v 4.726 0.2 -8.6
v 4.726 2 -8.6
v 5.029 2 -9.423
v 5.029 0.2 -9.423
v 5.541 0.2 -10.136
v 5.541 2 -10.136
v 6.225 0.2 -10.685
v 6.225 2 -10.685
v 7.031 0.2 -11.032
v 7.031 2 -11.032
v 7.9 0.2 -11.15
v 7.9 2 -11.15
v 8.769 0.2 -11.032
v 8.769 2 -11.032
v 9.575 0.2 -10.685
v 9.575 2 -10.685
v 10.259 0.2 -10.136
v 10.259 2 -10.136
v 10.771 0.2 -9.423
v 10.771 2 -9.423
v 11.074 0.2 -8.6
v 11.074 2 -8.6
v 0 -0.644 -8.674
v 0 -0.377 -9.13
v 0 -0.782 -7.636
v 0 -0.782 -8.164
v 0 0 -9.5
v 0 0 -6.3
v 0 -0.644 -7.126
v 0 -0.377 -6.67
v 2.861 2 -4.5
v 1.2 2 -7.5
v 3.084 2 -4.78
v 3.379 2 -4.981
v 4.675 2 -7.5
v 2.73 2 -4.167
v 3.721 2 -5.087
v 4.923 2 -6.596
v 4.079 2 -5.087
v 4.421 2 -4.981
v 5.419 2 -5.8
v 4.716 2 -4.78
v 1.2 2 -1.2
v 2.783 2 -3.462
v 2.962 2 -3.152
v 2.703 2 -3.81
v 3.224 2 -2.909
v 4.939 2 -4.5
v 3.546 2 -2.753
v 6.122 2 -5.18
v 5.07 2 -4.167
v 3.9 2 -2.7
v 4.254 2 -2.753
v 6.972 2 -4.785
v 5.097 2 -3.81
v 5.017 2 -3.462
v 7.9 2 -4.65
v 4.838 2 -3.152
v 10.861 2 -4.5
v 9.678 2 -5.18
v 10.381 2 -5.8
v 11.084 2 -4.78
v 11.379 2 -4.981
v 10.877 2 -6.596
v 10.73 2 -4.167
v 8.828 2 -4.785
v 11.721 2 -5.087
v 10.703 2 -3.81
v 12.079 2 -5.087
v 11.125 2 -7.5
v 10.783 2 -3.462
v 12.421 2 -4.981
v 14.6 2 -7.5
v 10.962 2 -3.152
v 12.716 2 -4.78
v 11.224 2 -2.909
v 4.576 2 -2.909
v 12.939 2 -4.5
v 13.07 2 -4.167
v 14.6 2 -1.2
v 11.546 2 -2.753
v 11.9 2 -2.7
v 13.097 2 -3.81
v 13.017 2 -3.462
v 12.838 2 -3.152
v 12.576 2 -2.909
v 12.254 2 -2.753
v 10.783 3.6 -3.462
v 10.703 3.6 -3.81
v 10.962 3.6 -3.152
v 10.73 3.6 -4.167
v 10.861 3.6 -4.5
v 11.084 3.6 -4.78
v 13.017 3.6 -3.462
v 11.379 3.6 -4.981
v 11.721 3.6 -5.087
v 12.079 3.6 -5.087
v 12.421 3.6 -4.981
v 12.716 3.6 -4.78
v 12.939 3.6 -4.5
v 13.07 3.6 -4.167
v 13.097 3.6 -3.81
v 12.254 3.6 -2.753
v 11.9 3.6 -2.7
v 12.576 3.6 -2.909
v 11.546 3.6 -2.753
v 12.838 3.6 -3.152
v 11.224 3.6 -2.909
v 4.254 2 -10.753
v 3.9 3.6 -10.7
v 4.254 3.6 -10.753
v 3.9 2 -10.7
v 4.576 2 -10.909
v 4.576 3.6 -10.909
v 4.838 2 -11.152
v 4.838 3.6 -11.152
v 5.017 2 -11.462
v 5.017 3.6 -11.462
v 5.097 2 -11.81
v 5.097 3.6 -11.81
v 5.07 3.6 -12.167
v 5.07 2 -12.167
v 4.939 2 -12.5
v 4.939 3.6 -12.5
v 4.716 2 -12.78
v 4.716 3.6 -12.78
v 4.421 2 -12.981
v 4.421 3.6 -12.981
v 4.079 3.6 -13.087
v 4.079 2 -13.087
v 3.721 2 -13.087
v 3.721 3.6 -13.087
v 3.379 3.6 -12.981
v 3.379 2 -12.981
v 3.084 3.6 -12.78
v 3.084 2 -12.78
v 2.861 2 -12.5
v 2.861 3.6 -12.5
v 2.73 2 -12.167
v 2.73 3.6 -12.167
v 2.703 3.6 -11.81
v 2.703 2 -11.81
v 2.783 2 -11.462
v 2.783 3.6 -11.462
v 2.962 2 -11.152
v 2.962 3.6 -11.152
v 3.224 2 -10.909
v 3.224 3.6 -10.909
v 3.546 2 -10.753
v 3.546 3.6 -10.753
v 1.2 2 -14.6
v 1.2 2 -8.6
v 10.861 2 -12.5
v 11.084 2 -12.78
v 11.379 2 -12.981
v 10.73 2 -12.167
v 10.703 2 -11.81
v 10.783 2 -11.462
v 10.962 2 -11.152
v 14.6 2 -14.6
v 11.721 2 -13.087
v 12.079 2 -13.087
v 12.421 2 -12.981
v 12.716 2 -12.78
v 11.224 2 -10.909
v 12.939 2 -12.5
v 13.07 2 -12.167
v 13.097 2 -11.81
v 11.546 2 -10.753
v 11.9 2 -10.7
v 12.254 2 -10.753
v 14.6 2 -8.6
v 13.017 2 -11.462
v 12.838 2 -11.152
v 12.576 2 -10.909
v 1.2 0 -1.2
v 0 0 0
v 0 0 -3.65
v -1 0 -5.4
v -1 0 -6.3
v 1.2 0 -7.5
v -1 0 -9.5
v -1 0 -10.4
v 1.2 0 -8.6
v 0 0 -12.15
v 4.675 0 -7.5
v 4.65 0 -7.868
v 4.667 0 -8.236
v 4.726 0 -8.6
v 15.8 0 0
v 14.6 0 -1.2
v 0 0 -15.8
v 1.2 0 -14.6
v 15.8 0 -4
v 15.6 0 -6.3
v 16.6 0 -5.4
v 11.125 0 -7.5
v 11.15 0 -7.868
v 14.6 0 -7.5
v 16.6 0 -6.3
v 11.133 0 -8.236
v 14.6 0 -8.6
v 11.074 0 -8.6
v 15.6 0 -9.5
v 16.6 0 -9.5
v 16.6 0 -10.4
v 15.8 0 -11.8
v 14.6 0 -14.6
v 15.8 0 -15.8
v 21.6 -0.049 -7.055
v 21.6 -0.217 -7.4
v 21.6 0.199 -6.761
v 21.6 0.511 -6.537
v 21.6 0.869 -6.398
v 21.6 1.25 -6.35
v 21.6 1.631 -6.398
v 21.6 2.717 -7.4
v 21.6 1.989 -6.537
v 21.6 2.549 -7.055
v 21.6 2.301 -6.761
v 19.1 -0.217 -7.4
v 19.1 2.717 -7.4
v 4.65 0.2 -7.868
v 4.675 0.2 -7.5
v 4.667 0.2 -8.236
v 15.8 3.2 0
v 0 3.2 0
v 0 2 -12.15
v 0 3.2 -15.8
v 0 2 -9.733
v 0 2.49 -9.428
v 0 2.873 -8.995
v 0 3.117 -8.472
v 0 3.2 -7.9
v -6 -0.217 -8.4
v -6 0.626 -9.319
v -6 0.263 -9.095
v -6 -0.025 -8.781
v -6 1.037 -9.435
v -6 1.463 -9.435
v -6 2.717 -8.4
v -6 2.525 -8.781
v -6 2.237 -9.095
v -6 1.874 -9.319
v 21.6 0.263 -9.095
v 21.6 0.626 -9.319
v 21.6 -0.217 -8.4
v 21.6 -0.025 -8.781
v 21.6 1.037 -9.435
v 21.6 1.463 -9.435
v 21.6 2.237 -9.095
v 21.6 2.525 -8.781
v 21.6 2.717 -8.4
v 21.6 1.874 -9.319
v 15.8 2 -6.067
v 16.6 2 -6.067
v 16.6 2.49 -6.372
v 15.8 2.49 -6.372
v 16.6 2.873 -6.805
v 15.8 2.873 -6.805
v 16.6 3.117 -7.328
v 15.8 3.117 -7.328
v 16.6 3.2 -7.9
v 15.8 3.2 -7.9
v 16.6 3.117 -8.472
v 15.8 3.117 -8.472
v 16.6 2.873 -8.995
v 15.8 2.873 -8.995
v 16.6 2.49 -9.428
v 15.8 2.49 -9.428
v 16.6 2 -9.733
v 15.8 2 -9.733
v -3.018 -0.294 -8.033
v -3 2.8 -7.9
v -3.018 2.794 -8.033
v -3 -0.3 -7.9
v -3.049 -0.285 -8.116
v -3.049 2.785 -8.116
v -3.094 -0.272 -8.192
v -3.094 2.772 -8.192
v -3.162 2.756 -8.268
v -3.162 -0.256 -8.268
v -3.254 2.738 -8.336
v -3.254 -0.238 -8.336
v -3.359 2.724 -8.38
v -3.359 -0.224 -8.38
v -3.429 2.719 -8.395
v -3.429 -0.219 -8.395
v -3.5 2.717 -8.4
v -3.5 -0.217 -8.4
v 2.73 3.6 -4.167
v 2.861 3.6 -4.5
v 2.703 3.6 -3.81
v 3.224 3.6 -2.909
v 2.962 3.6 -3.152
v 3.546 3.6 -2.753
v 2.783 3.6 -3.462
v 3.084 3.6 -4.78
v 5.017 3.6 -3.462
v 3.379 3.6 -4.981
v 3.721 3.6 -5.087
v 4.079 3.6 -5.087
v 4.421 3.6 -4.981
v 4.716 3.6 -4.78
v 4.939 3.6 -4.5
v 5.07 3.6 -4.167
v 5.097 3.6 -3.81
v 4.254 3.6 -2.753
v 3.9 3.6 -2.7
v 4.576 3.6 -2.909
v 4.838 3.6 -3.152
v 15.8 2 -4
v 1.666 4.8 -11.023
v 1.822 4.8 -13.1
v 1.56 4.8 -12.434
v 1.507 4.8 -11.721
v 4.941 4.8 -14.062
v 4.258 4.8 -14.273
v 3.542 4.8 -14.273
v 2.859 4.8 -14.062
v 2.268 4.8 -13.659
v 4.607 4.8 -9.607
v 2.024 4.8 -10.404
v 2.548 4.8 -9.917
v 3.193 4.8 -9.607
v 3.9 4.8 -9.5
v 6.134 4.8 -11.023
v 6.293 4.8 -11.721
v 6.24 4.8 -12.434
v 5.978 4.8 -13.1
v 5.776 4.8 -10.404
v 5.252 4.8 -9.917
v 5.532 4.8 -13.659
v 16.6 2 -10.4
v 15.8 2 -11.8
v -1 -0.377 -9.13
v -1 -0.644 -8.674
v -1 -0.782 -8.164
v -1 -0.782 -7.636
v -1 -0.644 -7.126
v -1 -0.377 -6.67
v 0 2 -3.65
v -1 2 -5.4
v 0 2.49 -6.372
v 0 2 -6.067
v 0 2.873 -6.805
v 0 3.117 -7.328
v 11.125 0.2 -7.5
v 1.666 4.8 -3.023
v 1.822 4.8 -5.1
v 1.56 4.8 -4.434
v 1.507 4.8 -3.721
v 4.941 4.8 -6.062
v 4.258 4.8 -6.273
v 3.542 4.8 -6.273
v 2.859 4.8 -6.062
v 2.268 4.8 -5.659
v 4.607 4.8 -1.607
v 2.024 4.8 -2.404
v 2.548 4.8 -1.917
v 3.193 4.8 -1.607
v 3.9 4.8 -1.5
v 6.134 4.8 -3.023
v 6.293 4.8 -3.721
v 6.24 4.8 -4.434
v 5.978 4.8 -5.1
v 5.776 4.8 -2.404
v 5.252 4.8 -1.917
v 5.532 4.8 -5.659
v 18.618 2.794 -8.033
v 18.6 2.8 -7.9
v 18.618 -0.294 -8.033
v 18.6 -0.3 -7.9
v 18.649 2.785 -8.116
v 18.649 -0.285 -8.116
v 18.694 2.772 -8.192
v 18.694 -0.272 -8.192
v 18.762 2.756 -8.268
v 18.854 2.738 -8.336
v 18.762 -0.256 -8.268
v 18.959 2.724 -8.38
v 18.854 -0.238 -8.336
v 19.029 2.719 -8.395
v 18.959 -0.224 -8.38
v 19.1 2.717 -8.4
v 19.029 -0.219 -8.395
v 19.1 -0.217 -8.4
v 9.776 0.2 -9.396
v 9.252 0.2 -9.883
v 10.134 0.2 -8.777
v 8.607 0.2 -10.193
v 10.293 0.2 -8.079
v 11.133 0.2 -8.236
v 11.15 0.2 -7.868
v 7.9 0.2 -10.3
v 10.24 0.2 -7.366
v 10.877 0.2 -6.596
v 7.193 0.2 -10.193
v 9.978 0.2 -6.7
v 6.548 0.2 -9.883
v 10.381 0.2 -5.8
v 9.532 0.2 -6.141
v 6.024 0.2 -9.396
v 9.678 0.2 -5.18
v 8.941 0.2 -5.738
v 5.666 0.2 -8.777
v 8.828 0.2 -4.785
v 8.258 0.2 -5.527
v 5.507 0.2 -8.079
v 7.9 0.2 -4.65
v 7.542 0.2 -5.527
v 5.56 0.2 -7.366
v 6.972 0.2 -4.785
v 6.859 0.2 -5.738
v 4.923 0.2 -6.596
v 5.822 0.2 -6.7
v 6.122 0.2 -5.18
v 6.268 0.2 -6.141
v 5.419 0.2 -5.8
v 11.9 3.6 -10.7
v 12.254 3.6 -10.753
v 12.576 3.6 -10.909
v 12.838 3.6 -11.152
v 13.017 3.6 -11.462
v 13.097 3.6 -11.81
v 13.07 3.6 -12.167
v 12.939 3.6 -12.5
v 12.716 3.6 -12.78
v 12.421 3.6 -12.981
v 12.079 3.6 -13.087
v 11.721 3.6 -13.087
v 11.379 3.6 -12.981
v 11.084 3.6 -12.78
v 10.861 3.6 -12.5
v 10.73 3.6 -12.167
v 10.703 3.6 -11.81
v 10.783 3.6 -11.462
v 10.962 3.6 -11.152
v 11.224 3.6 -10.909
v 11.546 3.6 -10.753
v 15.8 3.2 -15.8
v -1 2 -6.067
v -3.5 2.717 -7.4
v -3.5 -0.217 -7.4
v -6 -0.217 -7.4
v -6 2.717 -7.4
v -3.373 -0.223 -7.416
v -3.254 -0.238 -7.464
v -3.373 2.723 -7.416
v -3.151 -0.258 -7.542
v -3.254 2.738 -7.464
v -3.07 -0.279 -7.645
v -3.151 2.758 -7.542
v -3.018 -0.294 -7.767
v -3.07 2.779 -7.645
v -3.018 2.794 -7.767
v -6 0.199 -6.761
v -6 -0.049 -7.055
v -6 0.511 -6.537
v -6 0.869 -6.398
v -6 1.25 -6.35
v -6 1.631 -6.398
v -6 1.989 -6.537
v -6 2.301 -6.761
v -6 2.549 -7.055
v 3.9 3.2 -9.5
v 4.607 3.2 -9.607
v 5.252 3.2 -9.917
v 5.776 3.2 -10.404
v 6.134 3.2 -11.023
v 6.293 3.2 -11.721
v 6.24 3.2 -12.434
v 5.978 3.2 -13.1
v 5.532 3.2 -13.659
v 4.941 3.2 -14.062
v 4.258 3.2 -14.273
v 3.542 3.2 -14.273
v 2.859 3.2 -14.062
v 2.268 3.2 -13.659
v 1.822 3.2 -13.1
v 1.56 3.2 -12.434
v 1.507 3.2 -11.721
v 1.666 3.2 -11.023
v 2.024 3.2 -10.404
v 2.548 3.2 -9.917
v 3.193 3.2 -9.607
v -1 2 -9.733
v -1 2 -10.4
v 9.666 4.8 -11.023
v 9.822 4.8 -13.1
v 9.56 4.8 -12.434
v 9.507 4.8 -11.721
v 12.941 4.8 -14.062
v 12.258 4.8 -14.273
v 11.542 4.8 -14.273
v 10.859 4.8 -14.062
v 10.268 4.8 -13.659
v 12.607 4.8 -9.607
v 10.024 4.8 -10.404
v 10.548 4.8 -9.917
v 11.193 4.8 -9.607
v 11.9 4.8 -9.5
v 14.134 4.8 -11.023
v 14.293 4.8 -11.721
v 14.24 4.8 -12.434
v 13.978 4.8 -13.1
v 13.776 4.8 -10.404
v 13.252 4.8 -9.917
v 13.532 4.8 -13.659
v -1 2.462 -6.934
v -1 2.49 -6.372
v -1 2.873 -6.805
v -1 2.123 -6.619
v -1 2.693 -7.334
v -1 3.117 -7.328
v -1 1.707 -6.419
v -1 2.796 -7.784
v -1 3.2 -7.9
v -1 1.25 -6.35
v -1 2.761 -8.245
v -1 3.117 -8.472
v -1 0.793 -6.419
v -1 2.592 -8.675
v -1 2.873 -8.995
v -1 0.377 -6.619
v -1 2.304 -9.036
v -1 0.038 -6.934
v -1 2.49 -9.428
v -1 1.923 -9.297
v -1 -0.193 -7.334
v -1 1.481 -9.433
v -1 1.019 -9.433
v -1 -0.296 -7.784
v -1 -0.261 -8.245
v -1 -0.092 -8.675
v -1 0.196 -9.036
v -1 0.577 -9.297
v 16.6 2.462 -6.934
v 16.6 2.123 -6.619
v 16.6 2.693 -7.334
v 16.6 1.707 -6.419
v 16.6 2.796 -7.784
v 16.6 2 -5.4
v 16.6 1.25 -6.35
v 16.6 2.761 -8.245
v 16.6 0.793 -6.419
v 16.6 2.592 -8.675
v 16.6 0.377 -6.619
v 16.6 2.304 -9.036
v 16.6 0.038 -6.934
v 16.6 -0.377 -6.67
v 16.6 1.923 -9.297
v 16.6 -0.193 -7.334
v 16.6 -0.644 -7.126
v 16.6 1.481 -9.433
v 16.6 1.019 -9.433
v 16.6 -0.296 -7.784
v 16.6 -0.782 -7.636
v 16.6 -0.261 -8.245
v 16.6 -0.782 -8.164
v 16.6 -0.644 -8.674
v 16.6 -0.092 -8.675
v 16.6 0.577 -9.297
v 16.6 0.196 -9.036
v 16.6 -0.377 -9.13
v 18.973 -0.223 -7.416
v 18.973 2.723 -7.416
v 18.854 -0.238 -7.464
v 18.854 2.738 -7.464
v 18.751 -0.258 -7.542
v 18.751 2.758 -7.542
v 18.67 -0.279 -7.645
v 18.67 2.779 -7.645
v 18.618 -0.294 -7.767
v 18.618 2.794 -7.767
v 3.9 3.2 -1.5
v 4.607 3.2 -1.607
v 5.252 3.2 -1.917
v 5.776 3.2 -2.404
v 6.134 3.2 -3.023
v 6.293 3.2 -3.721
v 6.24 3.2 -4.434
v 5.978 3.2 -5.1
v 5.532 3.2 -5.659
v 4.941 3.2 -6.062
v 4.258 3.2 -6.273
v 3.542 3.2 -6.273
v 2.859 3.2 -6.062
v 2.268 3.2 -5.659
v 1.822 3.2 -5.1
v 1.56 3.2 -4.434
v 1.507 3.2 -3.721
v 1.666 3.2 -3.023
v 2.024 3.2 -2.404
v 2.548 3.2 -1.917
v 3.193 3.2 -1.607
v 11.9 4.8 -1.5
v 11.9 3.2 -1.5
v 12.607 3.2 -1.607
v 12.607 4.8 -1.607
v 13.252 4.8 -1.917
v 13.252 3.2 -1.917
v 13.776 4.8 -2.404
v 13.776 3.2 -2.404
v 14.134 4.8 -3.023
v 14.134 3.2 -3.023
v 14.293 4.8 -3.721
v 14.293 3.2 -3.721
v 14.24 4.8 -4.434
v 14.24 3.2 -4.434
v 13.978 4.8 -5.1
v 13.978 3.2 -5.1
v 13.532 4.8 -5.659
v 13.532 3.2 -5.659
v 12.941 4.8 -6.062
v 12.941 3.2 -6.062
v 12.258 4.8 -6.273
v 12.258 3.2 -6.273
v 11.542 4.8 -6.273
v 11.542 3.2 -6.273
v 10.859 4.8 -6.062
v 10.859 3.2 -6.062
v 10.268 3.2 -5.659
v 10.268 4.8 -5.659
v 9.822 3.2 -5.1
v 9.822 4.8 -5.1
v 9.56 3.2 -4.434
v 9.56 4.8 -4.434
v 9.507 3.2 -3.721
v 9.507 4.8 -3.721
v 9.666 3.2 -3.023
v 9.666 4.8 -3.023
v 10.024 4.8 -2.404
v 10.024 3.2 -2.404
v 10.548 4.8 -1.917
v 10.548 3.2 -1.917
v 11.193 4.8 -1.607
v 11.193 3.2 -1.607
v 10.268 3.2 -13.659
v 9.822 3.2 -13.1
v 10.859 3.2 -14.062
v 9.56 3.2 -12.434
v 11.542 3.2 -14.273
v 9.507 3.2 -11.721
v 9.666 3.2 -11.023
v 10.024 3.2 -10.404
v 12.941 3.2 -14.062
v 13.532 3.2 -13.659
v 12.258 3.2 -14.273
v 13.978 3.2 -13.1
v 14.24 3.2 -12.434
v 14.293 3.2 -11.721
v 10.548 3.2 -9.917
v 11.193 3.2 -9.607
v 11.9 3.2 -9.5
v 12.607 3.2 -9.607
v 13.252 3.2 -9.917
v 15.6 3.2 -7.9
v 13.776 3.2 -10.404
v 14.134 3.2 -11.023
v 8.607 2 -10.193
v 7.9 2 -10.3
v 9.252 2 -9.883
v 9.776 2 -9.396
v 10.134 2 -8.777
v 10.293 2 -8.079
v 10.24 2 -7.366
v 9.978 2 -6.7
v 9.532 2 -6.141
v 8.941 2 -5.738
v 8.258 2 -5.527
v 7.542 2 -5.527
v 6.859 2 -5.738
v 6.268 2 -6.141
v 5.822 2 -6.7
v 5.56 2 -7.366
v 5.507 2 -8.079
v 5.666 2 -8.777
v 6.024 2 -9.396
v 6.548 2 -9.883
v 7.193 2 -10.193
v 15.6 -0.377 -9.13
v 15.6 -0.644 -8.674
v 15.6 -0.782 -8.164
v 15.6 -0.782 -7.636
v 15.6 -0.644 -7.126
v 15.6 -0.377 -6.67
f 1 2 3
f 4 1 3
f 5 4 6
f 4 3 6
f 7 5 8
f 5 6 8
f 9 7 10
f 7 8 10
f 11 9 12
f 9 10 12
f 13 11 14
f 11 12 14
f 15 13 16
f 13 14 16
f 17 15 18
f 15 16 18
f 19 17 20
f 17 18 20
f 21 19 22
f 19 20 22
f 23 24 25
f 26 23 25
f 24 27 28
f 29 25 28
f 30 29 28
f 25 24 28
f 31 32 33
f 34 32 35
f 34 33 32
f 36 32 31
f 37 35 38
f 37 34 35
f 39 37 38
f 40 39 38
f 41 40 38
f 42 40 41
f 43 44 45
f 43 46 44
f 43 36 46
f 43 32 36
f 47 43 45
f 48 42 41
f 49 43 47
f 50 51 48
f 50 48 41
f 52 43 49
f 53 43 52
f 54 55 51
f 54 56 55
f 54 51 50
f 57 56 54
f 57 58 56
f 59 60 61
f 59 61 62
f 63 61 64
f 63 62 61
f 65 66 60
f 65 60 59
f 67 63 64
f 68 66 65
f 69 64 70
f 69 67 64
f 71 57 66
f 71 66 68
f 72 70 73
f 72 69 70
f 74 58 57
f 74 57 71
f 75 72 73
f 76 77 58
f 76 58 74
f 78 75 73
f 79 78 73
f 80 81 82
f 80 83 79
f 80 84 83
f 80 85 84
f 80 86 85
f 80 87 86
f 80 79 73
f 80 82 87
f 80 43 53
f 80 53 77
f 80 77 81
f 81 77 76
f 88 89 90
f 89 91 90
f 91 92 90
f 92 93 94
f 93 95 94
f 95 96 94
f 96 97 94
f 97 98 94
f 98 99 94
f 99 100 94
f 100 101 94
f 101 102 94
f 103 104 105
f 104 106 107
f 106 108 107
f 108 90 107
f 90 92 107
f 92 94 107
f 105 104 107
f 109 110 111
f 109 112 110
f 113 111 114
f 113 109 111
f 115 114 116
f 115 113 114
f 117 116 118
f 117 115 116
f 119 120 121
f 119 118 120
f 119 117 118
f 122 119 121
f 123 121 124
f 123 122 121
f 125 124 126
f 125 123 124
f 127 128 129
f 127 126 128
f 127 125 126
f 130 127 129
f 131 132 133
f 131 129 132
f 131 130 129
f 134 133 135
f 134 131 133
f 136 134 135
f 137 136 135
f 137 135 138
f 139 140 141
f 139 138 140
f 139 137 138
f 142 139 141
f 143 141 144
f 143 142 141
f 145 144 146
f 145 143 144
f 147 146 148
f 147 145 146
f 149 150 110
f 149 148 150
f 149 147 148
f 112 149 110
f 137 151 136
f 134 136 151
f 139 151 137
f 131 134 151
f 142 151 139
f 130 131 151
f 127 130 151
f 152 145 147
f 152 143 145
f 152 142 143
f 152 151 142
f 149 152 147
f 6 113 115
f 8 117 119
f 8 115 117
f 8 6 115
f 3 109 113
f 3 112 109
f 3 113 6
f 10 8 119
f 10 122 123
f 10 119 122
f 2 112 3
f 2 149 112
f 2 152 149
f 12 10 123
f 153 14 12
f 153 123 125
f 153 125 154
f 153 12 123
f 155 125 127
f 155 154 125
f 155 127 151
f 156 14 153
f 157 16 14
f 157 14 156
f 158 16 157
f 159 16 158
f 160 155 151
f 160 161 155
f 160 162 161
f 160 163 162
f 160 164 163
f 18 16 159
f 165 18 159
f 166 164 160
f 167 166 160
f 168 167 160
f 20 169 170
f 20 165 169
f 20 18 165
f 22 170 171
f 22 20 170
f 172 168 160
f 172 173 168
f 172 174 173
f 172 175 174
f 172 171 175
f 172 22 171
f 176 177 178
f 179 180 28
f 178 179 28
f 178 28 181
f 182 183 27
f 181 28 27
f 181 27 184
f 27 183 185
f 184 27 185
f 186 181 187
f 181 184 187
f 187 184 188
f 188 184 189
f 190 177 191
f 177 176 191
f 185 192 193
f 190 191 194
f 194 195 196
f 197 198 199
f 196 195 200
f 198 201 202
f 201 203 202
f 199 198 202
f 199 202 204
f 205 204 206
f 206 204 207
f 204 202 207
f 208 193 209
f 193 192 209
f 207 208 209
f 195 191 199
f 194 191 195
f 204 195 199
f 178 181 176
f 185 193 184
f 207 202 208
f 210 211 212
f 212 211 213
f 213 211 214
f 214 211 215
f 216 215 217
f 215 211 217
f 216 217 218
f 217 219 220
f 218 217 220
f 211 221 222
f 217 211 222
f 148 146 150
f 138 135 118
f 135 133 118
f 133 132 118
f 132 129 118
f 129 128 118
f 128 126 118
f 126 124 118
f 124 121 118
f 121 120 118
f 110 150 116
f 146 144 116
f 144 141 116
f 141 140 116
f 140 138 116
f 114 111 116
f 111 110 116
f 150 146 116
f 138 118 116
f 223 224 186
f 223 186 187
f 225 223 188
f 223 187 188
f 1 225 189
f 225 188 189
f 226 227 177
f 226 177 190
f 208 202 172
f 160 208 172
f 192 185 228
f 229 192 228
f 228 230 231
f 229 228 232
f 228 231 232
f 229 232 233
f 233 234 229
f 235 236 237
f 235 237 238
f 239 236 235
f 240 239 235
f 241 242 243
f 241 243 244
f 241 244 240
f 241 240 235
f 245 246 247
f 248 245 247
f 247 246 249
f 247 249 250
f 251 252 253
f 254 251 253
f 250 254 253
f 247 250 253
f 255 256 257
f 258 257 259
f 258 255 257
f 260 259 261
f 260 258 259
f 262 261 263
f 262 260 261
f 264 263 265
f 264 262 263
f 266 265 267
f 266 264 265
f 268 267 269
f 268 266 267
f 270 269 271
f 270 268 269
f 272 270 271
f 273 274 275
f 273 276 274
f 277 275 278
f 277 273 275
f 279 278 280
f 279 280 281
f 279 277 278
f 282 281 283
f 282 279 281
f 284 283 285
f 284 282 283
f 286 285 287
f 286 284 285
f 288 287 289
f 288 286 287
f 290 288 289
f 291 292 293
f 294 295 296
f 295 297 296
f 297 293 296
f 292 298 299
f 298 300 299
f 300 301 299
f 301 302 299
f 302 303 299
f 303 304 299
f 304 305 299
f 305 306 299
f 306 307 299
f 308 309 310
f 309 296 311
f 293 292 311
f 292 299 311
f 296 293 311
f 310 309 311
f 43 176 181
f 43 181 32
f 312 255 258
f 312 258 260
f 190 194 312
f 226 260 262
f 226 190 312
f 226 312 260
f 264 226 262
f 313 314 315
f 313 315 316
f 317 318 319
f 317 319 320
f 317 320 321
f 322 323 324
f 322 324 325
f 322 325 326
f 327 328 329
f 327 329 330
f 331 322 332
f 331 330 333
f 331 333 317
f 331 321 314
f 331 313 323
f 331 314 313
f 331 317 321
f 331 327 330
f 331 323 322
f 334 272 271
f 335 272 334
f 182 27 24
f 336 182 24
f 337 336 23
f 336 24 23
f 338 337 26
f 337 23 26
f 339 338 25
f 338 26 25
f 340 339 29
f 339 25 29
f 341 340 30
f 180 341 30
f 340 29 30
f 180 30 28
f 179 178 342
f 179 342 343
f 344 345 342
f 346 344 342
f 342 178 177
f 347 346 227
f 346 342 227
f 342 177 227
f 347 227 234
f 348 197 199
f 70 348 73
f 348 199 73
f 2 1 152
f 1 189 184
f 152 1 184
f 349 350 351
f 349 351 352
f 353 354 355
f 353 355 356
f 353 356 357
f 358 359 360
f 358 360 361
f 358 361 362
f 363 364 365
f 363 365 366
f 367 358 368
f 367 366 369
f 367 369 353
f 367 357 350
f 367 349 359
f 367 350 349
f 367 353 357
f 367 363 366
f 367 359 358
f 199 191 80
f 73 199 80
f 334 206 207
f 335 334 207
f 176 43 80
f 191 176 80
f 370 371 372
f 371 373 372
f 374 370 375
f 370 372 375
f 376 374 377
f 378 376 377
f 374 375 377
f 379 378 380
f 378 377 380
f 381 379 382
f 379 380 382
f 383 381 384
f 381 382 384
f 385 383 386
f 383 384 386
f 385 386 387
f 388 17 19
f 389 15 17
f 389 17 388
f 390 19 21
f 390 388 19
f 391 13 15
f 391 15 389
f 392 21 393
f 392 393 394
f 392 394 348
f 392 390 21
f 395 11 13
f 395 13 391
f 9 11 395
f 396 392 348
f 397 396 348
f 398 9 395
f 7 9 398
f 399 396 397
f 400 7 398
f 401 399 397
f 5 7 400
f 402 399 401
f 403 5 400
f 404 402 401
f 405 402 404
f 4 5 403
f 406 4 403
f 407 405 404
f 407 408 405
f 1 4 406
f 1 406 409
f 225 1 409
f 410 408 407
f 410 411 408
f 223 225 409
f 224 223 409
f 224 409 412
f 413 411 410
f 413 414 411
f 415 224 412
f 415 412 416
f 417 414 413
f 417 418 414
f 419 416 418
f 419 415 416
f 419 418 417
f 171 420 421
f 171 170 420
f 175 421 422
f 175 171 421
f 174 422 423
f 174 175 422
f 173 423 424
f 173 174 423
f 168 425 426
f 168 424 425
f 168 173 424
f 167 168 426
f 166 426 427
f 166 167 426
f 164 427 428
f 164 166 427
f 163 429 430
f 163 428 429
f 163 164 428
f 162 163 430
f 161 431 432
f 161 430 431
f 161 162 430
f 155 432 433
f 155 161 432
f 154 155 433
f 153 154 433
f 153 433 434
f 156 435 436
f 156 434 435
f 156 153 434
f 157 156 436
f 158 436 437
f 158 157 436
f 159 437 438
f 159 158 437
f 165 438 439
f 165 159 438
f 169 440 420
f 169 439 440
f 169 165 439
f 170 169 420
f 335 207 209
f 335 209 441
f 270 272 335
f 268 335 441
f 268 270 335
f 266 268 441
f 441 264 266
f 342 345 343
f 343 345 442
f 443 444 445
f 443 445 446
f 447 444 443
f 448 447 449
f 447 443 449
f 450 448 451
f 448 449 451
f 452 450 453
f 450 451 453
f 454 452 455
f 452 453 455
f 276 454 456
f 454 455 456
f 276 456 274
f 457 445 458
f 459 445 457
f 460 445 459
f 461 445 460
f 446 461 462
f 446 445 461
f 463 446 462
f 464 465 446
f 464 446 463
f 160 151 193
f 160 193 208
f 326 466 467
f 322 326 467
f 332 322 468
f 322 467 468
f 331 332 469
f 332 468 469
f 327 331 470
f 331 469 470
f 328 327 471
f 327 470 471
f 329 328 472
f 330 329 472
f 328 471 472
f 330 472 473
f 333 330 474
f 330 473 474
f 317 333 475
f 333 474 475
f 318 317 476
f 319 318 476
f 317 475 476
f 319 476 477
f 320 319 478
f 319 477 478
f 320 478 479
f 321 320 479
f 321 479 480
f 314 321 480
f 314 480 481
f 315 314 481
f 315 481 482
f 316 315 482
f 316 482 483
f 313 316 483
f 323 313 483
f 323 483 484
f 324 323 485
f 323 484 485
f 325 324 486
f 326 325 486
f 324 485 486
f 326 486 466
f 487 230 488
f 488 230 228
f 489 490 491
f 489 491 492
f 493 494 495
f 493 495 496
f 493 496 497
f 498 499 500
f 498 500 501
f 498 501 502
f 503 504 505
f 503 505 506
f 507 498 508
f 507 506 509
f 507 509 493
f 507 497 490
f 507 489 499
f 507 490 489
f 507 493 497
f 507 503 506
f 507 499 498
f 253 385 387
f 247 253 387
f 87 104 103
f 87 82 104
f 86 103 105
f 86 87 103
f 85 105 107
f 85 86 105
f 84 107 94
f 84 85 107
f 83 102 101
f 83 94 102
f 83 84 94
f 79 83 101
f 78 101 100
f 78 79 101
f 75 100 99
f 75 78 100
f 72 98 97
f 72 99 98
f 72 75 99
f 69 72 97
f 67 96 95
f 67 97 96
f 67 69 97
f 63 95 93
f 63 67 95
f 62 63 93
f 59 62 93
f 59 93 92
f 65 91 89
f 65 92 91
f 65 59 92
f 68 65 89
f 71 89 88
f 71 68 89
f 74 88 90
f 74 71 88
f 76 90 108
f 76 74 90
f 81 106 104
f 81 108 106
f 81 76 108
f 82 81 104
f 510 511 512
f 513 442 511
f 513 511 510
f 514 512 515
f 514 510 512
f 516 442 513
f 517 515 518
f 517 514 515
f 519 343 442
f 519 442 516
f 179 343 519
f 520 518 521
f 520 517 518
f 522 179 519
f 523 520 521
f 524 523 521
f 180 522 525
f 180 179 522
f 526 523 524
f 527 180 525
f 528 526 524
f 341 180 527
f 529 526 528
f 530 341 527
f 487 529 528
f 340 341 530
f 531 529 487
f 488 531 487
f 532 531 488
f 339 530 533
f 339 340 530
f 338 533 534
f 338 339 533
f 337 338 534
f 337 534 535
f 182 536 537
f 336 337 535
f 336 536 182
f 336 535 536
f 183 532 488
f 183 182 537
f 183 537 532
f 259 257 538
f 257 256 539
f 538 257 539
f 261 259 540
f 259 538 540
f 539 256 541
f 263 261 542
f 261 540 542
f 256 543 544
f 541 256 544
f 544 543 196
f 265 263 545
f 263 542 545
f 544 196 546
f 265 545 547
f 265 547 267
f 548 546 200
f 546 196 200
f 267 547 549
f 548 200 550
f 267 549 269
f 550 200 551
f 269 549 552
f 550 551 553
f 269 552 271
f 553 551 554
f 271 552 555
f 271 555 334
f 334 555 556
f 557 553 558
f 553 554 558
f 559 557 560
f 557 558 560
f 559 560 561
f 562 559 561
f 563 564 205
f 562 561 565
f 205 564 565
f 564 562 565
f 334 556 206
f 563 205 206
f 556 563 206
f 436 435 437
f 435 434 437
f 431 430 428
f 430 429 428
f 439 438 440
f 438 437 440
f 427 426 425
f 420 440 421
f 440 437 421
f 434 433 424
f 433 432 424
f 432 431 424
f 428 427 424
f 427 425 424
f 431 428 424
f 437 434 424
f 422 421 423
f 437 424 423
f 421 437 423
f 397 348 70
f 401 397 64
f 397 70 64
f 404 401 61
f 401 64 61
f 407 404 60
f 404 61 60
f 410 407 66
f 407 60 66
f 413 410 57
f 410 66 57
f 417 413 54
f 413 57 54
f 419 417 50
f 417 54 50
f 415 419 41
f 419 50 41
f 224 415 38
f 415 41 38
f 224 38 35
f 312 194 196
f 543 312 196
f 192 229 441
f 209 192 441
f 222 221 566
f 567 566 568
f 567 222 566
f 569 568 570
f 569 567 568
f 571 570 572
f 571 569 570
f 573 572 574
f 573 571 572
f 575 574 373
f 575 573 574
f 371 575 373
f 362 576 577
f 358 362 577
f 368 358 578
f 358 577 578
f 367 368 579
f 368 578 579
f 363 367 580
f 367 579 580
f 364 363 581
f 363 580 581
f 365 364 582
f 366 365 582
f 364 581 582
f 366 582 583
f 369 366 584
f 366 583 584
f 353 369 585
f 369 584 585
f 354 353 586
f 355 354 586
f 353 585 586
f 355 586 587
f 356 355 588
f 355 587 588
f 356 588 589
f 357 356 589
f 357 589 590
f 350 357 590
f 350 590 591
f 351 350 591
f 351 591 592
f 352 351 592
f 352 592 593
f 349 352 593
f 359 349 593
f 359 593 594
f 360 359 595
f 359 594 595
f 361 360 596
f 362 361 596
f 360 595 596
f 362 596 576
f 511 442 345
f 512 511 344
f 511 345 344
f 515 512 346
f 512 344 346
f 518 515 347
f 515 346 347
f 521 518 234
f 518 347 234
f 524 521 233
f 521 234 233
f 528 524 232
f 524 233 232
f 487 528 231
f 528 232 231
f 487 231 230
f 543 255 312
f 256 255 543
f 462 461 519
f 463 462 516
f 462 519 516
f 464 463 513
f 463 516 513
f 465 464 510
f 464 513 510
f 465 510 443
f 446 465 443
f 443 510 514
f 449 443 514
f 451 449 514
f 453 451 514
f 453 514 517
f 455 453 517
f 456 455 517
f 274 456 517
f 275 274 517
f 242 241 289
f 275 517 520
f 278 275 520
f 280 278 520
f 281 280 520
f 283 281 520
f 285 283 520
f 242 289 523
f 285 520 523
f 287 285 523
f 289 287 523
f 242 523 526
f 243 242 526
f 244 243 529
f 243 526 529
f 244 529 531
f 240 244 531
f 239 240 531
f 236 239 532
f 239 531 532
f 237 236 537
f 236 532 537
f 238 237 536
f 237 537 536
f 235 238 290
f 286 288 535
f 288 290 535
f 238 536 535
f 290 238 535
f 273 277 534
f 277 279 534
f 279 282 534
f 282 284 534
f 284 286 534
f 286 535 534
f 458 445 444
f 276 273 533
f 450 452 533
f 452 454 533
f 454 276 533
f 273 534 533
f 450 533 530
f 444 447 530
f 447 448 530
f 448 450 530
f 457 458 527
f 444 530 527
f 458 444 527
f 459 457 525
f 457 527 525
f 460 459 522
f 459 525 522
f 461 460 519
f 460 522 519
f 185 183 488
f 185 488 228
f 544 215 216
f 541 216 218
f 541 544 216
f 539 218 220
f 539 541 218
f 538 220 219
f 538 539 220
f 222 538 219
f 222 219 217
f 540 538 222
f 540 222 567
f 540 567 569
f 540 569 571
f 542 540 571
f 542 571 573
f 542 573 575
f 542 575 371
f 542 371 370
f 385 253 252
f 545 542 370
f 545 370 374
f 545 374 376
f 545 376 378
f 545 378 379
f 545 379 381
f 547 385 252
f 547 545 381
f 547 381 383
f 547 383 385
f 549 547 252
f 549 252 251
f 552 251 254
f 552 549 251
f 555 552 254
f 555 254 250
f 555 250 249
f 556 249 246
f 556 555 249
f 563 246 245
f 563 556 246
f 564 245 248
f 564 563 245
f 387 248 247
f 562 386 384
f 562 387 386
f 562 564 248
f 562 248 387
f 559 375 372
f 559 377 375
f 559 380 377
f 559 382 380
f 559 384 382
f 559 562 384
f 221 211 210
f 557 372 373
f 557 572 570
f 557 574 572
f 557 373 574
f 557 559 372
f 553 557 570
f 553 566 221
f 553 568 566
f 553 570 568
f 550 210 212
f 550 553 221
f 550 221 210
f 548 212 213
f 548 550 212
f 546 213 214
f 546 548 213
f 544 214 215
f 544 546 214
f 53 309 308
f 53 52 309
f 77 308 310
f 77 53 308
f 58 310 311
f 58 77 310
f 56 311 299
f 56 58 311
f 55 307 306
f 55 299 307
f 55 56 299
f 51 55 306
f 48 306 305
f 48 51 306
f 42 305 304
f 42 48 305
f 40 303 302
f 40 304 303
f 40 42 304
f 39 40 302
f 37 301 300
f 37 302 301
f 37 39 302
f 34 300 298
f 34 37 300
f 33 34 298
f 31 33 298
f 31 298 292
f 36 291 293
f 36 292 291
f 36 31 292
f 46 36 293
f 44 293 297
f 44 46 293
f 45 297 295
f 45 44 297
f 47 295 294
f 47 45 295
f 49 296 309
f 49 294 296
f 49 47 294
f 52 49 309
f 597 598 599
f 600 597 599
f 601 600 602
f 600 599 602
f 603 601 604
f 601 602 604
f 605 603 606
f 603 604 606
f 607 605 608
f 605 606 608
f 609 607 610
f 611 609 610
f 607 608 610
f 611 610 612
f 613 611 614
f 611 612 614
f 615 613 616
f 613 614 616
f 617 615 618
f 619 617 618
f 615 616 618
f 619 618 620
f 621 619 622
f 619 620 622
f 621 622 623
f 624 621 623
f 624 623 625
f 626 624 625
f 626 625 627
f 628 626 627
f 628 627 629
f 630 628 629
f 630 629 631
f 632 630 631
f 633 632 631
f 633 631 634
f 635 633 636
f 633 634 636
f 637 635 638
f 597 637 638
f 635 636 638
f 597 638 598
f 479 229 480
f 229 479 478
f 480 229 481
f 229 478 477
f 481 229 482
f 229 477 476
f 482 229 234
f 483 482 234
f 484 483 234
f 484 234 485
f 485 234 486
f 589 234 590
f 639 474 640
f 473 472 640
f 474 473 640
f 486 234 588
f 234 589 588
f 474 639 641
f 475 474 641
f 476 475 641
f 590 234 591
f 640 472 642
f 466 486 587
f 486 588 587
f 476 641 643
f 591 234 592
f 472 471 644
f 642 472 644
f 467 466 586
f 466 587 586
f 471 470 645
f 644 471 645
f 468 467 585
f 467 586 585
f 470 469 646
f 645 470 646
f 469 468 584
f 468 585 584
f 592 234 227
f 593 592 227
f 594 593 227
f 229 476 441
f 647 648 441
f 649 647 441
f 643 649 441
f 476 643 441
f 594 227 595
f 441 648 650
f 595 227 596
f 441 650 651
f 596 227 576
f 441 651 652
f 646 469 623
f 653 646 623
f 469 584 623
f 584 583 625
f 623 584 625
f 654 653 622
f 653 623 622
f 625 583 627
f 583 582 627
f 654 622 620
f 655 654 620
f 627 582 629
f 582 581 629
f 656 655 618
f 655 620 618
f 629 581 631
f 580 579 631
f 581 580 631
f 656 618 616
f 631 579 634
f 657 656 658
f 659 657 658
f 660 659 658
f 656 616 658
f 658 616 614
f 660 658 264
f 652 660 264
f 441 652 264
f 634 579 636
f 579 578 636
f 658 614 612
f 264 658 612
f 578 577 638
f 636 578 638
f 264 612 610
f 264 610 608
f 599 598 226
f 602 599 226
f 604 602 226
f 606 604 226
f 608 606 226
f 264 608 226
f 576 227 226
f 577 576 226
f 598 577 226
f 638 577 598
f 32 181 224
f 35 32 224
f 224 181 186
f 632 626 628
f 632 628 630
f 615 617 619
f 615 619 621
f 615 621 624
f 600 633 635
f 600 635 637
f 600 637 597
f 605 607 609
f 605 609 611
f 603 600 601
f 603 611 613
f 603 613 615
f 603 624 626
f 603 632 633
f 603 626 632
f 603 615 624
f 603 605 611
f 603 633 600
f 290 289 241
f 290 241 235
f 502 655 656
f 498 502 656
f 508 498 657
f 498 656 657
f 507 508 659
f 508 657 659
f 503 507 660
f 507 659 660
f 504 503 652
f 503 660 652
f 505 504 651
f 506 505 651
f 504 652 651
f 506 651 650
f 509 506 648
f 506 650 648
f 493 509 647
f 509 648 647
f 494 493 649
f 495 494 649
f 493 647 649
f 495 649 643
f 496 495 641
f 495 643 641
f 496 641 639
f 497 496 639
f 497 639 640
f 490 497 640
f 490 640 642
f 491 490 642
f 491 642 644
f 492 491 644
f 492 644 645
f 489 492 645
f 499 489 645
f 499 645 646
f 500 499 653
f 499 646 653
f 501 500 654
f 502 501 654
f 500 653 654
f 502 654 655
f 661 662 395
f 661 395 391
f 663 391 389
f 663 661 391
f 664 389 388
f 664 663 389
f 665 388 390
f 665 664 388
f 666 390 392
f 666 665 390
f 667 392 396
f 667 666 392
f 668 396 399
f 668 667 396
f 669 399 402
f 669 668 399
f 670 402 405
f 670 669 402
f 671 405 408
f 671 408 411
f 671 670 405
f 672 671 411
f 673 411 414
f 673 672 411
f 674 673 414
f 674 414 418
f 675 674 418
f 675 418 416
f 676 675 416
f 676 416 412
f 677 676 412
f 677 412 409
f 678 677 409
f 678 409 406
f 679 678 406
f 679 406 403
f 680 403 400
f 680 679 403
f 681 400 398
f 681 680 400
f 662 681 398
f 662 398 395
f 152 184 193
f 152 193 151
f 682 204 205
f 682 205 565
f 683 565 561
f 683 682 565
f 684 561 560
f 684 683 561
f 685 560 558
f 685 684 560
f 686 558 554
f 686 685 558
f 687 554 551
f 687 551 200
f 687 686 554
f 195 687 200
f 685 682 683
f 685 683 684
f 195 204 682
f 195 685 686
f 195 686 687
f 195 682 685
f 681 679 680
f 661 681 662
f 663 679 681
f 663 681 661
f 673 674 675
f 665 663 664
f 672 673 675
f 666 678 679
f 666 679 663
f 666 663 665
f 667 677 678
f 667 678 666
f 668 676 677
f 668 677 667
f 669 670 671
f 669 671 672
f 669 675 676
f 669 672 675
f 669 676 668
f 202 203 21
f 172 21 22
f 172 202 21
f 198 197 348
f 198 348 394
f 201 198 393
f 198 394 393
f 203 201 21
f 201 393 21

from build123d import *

# Parameters (mm, degrees)
SKETCH1_W                = 15.8
SKETCH1_H                = 3.2
BOSS_EXTRUDE1_DEPTH      = 15.8
SKETCH2_R                = 2.4
BOSS_EXTRUDE2_DEPTH      = 1.6
LPATTERN1_COUNT          = 2
LPATTERN1_PITCH          = 8
LPATTERN1_COUNT_DIR2     = 4
LPATTERN1_PITCH_DIR2     = 8
SHELL1_T                 = -1.2
SKETCH4_R                = 3.25
SKETCH4_R_2              = 2.4
BOSS_EXTRUDE3_DEPTH      = 1.8
BOSS_EXTRUDE4_REACH      = 24.042
BOSS_EXTRUDE4_END_RADIUS = 3.25
SKETCH6_W                = 1.1
SKETCH6_H                = 2
MIRROR1_DEPTH            = 2
BOSS_EXTRUDE6_DEPTH      = 2
BOSS_EXTRUDE7_START      = -0.3
SKETCH9_R                = 2
BOSS_EXTRUDE7_DEPTH      = 1
SKETCH10_R               = 1.55
BOSS_EXTRUDE8_DEPTH      = 5
CUT_EXTRUDE1_START       = -3
CUT_EXTRUDE1_DEPTH       = 3
FILLET1_R                = 0.5
FILLET1_OF_MIRROR2_R     = 0.5


# Read off the part's stored shape, not the designer's step: Mirror1
with BuildPart() as part:
    # Sketch1 → Boss-Extrude1 (new body)
    with BuildSketch(Plane.XY):
        with Locations((7.9, 1.6)):
            Rectangle(SKETCH1_W, SKETCH1_H)
    extrude(amount=-BOSS_EXTRUDE1_DEPTH)

    # Sketch2 → Boss-Extrude2 (add)
    with BuildSketch(Plane(origin=(0, 3.2, 0), x_dir=(1, 0, 0), z_dir=(0, 1, 0))):
        with Locations(Location((3.9, 3.9, 0), (0, 0, 270))):
            Circle(SKETCH2_R)
    boss_extrude2 = extrude(amount=BOSS_EXTRUDE2_DEPTH)

    # LPattern1: Boss-Extrude2 2 × 4, 4 skipped
    with Locations(*[(j * LPATTERN1_PITCH_DIR2, 0, -i * LPATTERN1_PITCH) for i in range(LPATTERN1_COUNT) for j in range(LPATTERN1_COUNT_DIR2) if (i, j) not in ((0, 0), (0, 2), (0, 3), (1, 2), (1, 3))]):
        add(boss_extrude2)

    # Shell1
    shell1_openings = [part.faces().sort_by_distance(p)[0] for p in [
        (7.9, 0, -7.9),
    ]]
    offset(amount=SHELL1_T, openings=shell1_openings, kind=Kind.INTERSECTION)

    # Sketch4 → Boss-Extrude3 (add)
    with BuildSketch(Plane.XZ.offset(-2)):
        with Locations(Location((7.9, -7.9, 0), (0, 0, 90))):
            Circle(SKETCH4_R)
        with Locations(Location((7.9, -7.9, 0), (0, 0, 270))):
            Circle(SKETCH4_R_2, mode=Mode.SUBTRACT)
    extrude(amount=BOSS_EXTRUDE3_DEPTH)

    # Boss-Extrude4: up to this cylinder (the profile starts outside it)
    boss_extrude4_end = Plane(origin=(7.9, 1, -7.9), z_dir=(0, 1, 0)) * Cylinder(BOSS_EXTRUDE4_END_RADIUS, 55.584, mode=Mode.PRIVATE)
    # Sketch6 → Boss-Extrude4 (add, up to the surface)
    with BuildSketch(Plane.ZY.offset(-14.6), mode=Mode.PRIVATE) as boss_extrude4_sk1:
        with Locations((-8.05, 1)):
            Rectangle(SKETCH6_W, SKETCH6_H)
    boss_extrude4_tool1 = extrude(boss_extrude4_sk1.sketch, amount=BOSS_EXTRUDE4_REACH, mode=Mode.PRIVATE) - boss_extrude4_end
    add(boss_extrude4_tool1.solids().sort_by_distance((14.6, 1, -8.05))[0])

    # Mirror1 outline → Mirror1 (add)
    with BuildSketch(Plane(origin=(0, 0, 0), x_dir=(1, 0, 0), z_dir=(0, 1, 0))):
        with BuildLine():
            Line((1.2, 8.6), (1.2, 7.5))
            Line((1.2, 7.5), (4.674709315, 7.5))
            ThreePointArc((4.674709315, 7.5), (4.653565784, 8.052200126), (4.726279785, 8.6))
            Line((4.726279785, 8.6), (1.2, 8.6))
        make_face()
    extrude(amount=MIRROR1_DEPTH)

    # Sketch8 → Boss-Extrude6 (add)
    with BuildSketch(Plane(origin=(0, 0, 0), x_dir=(-1, 0, 0), z_dir=(0, -1, 0))):
        Polygon((1, 10.4), (0, 12.15), (0, 3.65), (1, 5.4), (1, 6.4), (0.3, 6.4), (0.3, 9.4), (1, 9.4), align=None)
    boss_extrude6 = extrude(amount=-BOSS_EXTRUDE6_DEPTH)

    # Sketch9 → Boss-Extrude7 (add)
    with BuildSketch(Plane.ZY.offset(0.3).offset(BOSS_EXTRUDE7_START)):
        with Locations((-7.9, 1.2)):
            Circle(SKETCH9_R)
    boss_extrude7 = extrude(amount=BOSS_EXTRUDE7_DEPTH)

    # Sketch10 → Boss-Extrude8 (add)
    with BuildSketch(Plane.ZY.offset(1)):
        with Locations((-7.9, 1.25)):
            Circle(SKETCH10_R)
    boss_extrude8 = extrude(amount=BOSS_EXTRUDE8_DEPTH)

    # Sketch11 → Cut-Extrude1 (cut)
    with BuildSketch(Plane.ZY.offset(6).offset(CUT_EXTRUDE1_START)):
        with BuildLine():
            Line((-8.4, 2.717140075), (-8.4, -0.217140075))
            ThreePointArc((-8.4, -0.217140075), (-7.9, -0.3), (-7.4, -0.217140075))
            Line((-7.4, -0.217140075), (-7.4, 2.717140075))
            ThreePointArc((-7.4, 2.717140075), (-7.9, 2.8), (-8.4, 2.717140075))
        make_face()
    cut_extrude1 = extrude(amount=CUT_EXTRUDE1_DEPTH, mode=Mode.SUBTRACT)

    # Fillet1
    fillet1_edges = [part.edges().sort_by_distance(p)[0] for p in [
        (-3, 1.25, -8.4),
        (-3, 1.25, -7.4),
    ]]
    fillet(fillet1_edges, radius=FILLET1_R - 0.0001)  # a hair under: the kernel refuses the full size

    # Mirror2: Boss-Extrude6, Boss-Extrude7, Boss-Extrude8, Cut-Extrude1 across plane
    add(boss_extrude6.mirror(Plane(origin=(7.8, 0, 0), x_dir=(0, 0, 1), z_dir=(1, 0, 0))))
    add(boss_extrude7.mirror(Plane(origin=(7.8, 0, 0), x_dir=(0, 0, 1), z_dir=(1, 0, 0))))
    add(boss_extrude8.mirror(Plane(origin=(7.8, 0, 0), x_dir=(0, 0, 1), z_dir=(1, 0, 0))))
    add(cut_extrude1.mirror(Plane(origin=(7.8, 0, 0), x_dir=(0, 0, 1), z_dir=(1, 0, 0))), mode=Mode.SUBTRACT)

    # Fillet1 of Mirror2
    fillet1_of_mirror2_edges = [part.edges().sort_by_distance(p)[0] for p in [
        (18.6, 1.25, -8.4),
        (18.6, 1.25, -7.4),
    ]]
    fillet(fillet1_of_mirror2_edges, radius=FILLET1_OF_MIRROR2_R - 0.0001)  # a hair under: the kernel refuses the full size


solid = part.part
